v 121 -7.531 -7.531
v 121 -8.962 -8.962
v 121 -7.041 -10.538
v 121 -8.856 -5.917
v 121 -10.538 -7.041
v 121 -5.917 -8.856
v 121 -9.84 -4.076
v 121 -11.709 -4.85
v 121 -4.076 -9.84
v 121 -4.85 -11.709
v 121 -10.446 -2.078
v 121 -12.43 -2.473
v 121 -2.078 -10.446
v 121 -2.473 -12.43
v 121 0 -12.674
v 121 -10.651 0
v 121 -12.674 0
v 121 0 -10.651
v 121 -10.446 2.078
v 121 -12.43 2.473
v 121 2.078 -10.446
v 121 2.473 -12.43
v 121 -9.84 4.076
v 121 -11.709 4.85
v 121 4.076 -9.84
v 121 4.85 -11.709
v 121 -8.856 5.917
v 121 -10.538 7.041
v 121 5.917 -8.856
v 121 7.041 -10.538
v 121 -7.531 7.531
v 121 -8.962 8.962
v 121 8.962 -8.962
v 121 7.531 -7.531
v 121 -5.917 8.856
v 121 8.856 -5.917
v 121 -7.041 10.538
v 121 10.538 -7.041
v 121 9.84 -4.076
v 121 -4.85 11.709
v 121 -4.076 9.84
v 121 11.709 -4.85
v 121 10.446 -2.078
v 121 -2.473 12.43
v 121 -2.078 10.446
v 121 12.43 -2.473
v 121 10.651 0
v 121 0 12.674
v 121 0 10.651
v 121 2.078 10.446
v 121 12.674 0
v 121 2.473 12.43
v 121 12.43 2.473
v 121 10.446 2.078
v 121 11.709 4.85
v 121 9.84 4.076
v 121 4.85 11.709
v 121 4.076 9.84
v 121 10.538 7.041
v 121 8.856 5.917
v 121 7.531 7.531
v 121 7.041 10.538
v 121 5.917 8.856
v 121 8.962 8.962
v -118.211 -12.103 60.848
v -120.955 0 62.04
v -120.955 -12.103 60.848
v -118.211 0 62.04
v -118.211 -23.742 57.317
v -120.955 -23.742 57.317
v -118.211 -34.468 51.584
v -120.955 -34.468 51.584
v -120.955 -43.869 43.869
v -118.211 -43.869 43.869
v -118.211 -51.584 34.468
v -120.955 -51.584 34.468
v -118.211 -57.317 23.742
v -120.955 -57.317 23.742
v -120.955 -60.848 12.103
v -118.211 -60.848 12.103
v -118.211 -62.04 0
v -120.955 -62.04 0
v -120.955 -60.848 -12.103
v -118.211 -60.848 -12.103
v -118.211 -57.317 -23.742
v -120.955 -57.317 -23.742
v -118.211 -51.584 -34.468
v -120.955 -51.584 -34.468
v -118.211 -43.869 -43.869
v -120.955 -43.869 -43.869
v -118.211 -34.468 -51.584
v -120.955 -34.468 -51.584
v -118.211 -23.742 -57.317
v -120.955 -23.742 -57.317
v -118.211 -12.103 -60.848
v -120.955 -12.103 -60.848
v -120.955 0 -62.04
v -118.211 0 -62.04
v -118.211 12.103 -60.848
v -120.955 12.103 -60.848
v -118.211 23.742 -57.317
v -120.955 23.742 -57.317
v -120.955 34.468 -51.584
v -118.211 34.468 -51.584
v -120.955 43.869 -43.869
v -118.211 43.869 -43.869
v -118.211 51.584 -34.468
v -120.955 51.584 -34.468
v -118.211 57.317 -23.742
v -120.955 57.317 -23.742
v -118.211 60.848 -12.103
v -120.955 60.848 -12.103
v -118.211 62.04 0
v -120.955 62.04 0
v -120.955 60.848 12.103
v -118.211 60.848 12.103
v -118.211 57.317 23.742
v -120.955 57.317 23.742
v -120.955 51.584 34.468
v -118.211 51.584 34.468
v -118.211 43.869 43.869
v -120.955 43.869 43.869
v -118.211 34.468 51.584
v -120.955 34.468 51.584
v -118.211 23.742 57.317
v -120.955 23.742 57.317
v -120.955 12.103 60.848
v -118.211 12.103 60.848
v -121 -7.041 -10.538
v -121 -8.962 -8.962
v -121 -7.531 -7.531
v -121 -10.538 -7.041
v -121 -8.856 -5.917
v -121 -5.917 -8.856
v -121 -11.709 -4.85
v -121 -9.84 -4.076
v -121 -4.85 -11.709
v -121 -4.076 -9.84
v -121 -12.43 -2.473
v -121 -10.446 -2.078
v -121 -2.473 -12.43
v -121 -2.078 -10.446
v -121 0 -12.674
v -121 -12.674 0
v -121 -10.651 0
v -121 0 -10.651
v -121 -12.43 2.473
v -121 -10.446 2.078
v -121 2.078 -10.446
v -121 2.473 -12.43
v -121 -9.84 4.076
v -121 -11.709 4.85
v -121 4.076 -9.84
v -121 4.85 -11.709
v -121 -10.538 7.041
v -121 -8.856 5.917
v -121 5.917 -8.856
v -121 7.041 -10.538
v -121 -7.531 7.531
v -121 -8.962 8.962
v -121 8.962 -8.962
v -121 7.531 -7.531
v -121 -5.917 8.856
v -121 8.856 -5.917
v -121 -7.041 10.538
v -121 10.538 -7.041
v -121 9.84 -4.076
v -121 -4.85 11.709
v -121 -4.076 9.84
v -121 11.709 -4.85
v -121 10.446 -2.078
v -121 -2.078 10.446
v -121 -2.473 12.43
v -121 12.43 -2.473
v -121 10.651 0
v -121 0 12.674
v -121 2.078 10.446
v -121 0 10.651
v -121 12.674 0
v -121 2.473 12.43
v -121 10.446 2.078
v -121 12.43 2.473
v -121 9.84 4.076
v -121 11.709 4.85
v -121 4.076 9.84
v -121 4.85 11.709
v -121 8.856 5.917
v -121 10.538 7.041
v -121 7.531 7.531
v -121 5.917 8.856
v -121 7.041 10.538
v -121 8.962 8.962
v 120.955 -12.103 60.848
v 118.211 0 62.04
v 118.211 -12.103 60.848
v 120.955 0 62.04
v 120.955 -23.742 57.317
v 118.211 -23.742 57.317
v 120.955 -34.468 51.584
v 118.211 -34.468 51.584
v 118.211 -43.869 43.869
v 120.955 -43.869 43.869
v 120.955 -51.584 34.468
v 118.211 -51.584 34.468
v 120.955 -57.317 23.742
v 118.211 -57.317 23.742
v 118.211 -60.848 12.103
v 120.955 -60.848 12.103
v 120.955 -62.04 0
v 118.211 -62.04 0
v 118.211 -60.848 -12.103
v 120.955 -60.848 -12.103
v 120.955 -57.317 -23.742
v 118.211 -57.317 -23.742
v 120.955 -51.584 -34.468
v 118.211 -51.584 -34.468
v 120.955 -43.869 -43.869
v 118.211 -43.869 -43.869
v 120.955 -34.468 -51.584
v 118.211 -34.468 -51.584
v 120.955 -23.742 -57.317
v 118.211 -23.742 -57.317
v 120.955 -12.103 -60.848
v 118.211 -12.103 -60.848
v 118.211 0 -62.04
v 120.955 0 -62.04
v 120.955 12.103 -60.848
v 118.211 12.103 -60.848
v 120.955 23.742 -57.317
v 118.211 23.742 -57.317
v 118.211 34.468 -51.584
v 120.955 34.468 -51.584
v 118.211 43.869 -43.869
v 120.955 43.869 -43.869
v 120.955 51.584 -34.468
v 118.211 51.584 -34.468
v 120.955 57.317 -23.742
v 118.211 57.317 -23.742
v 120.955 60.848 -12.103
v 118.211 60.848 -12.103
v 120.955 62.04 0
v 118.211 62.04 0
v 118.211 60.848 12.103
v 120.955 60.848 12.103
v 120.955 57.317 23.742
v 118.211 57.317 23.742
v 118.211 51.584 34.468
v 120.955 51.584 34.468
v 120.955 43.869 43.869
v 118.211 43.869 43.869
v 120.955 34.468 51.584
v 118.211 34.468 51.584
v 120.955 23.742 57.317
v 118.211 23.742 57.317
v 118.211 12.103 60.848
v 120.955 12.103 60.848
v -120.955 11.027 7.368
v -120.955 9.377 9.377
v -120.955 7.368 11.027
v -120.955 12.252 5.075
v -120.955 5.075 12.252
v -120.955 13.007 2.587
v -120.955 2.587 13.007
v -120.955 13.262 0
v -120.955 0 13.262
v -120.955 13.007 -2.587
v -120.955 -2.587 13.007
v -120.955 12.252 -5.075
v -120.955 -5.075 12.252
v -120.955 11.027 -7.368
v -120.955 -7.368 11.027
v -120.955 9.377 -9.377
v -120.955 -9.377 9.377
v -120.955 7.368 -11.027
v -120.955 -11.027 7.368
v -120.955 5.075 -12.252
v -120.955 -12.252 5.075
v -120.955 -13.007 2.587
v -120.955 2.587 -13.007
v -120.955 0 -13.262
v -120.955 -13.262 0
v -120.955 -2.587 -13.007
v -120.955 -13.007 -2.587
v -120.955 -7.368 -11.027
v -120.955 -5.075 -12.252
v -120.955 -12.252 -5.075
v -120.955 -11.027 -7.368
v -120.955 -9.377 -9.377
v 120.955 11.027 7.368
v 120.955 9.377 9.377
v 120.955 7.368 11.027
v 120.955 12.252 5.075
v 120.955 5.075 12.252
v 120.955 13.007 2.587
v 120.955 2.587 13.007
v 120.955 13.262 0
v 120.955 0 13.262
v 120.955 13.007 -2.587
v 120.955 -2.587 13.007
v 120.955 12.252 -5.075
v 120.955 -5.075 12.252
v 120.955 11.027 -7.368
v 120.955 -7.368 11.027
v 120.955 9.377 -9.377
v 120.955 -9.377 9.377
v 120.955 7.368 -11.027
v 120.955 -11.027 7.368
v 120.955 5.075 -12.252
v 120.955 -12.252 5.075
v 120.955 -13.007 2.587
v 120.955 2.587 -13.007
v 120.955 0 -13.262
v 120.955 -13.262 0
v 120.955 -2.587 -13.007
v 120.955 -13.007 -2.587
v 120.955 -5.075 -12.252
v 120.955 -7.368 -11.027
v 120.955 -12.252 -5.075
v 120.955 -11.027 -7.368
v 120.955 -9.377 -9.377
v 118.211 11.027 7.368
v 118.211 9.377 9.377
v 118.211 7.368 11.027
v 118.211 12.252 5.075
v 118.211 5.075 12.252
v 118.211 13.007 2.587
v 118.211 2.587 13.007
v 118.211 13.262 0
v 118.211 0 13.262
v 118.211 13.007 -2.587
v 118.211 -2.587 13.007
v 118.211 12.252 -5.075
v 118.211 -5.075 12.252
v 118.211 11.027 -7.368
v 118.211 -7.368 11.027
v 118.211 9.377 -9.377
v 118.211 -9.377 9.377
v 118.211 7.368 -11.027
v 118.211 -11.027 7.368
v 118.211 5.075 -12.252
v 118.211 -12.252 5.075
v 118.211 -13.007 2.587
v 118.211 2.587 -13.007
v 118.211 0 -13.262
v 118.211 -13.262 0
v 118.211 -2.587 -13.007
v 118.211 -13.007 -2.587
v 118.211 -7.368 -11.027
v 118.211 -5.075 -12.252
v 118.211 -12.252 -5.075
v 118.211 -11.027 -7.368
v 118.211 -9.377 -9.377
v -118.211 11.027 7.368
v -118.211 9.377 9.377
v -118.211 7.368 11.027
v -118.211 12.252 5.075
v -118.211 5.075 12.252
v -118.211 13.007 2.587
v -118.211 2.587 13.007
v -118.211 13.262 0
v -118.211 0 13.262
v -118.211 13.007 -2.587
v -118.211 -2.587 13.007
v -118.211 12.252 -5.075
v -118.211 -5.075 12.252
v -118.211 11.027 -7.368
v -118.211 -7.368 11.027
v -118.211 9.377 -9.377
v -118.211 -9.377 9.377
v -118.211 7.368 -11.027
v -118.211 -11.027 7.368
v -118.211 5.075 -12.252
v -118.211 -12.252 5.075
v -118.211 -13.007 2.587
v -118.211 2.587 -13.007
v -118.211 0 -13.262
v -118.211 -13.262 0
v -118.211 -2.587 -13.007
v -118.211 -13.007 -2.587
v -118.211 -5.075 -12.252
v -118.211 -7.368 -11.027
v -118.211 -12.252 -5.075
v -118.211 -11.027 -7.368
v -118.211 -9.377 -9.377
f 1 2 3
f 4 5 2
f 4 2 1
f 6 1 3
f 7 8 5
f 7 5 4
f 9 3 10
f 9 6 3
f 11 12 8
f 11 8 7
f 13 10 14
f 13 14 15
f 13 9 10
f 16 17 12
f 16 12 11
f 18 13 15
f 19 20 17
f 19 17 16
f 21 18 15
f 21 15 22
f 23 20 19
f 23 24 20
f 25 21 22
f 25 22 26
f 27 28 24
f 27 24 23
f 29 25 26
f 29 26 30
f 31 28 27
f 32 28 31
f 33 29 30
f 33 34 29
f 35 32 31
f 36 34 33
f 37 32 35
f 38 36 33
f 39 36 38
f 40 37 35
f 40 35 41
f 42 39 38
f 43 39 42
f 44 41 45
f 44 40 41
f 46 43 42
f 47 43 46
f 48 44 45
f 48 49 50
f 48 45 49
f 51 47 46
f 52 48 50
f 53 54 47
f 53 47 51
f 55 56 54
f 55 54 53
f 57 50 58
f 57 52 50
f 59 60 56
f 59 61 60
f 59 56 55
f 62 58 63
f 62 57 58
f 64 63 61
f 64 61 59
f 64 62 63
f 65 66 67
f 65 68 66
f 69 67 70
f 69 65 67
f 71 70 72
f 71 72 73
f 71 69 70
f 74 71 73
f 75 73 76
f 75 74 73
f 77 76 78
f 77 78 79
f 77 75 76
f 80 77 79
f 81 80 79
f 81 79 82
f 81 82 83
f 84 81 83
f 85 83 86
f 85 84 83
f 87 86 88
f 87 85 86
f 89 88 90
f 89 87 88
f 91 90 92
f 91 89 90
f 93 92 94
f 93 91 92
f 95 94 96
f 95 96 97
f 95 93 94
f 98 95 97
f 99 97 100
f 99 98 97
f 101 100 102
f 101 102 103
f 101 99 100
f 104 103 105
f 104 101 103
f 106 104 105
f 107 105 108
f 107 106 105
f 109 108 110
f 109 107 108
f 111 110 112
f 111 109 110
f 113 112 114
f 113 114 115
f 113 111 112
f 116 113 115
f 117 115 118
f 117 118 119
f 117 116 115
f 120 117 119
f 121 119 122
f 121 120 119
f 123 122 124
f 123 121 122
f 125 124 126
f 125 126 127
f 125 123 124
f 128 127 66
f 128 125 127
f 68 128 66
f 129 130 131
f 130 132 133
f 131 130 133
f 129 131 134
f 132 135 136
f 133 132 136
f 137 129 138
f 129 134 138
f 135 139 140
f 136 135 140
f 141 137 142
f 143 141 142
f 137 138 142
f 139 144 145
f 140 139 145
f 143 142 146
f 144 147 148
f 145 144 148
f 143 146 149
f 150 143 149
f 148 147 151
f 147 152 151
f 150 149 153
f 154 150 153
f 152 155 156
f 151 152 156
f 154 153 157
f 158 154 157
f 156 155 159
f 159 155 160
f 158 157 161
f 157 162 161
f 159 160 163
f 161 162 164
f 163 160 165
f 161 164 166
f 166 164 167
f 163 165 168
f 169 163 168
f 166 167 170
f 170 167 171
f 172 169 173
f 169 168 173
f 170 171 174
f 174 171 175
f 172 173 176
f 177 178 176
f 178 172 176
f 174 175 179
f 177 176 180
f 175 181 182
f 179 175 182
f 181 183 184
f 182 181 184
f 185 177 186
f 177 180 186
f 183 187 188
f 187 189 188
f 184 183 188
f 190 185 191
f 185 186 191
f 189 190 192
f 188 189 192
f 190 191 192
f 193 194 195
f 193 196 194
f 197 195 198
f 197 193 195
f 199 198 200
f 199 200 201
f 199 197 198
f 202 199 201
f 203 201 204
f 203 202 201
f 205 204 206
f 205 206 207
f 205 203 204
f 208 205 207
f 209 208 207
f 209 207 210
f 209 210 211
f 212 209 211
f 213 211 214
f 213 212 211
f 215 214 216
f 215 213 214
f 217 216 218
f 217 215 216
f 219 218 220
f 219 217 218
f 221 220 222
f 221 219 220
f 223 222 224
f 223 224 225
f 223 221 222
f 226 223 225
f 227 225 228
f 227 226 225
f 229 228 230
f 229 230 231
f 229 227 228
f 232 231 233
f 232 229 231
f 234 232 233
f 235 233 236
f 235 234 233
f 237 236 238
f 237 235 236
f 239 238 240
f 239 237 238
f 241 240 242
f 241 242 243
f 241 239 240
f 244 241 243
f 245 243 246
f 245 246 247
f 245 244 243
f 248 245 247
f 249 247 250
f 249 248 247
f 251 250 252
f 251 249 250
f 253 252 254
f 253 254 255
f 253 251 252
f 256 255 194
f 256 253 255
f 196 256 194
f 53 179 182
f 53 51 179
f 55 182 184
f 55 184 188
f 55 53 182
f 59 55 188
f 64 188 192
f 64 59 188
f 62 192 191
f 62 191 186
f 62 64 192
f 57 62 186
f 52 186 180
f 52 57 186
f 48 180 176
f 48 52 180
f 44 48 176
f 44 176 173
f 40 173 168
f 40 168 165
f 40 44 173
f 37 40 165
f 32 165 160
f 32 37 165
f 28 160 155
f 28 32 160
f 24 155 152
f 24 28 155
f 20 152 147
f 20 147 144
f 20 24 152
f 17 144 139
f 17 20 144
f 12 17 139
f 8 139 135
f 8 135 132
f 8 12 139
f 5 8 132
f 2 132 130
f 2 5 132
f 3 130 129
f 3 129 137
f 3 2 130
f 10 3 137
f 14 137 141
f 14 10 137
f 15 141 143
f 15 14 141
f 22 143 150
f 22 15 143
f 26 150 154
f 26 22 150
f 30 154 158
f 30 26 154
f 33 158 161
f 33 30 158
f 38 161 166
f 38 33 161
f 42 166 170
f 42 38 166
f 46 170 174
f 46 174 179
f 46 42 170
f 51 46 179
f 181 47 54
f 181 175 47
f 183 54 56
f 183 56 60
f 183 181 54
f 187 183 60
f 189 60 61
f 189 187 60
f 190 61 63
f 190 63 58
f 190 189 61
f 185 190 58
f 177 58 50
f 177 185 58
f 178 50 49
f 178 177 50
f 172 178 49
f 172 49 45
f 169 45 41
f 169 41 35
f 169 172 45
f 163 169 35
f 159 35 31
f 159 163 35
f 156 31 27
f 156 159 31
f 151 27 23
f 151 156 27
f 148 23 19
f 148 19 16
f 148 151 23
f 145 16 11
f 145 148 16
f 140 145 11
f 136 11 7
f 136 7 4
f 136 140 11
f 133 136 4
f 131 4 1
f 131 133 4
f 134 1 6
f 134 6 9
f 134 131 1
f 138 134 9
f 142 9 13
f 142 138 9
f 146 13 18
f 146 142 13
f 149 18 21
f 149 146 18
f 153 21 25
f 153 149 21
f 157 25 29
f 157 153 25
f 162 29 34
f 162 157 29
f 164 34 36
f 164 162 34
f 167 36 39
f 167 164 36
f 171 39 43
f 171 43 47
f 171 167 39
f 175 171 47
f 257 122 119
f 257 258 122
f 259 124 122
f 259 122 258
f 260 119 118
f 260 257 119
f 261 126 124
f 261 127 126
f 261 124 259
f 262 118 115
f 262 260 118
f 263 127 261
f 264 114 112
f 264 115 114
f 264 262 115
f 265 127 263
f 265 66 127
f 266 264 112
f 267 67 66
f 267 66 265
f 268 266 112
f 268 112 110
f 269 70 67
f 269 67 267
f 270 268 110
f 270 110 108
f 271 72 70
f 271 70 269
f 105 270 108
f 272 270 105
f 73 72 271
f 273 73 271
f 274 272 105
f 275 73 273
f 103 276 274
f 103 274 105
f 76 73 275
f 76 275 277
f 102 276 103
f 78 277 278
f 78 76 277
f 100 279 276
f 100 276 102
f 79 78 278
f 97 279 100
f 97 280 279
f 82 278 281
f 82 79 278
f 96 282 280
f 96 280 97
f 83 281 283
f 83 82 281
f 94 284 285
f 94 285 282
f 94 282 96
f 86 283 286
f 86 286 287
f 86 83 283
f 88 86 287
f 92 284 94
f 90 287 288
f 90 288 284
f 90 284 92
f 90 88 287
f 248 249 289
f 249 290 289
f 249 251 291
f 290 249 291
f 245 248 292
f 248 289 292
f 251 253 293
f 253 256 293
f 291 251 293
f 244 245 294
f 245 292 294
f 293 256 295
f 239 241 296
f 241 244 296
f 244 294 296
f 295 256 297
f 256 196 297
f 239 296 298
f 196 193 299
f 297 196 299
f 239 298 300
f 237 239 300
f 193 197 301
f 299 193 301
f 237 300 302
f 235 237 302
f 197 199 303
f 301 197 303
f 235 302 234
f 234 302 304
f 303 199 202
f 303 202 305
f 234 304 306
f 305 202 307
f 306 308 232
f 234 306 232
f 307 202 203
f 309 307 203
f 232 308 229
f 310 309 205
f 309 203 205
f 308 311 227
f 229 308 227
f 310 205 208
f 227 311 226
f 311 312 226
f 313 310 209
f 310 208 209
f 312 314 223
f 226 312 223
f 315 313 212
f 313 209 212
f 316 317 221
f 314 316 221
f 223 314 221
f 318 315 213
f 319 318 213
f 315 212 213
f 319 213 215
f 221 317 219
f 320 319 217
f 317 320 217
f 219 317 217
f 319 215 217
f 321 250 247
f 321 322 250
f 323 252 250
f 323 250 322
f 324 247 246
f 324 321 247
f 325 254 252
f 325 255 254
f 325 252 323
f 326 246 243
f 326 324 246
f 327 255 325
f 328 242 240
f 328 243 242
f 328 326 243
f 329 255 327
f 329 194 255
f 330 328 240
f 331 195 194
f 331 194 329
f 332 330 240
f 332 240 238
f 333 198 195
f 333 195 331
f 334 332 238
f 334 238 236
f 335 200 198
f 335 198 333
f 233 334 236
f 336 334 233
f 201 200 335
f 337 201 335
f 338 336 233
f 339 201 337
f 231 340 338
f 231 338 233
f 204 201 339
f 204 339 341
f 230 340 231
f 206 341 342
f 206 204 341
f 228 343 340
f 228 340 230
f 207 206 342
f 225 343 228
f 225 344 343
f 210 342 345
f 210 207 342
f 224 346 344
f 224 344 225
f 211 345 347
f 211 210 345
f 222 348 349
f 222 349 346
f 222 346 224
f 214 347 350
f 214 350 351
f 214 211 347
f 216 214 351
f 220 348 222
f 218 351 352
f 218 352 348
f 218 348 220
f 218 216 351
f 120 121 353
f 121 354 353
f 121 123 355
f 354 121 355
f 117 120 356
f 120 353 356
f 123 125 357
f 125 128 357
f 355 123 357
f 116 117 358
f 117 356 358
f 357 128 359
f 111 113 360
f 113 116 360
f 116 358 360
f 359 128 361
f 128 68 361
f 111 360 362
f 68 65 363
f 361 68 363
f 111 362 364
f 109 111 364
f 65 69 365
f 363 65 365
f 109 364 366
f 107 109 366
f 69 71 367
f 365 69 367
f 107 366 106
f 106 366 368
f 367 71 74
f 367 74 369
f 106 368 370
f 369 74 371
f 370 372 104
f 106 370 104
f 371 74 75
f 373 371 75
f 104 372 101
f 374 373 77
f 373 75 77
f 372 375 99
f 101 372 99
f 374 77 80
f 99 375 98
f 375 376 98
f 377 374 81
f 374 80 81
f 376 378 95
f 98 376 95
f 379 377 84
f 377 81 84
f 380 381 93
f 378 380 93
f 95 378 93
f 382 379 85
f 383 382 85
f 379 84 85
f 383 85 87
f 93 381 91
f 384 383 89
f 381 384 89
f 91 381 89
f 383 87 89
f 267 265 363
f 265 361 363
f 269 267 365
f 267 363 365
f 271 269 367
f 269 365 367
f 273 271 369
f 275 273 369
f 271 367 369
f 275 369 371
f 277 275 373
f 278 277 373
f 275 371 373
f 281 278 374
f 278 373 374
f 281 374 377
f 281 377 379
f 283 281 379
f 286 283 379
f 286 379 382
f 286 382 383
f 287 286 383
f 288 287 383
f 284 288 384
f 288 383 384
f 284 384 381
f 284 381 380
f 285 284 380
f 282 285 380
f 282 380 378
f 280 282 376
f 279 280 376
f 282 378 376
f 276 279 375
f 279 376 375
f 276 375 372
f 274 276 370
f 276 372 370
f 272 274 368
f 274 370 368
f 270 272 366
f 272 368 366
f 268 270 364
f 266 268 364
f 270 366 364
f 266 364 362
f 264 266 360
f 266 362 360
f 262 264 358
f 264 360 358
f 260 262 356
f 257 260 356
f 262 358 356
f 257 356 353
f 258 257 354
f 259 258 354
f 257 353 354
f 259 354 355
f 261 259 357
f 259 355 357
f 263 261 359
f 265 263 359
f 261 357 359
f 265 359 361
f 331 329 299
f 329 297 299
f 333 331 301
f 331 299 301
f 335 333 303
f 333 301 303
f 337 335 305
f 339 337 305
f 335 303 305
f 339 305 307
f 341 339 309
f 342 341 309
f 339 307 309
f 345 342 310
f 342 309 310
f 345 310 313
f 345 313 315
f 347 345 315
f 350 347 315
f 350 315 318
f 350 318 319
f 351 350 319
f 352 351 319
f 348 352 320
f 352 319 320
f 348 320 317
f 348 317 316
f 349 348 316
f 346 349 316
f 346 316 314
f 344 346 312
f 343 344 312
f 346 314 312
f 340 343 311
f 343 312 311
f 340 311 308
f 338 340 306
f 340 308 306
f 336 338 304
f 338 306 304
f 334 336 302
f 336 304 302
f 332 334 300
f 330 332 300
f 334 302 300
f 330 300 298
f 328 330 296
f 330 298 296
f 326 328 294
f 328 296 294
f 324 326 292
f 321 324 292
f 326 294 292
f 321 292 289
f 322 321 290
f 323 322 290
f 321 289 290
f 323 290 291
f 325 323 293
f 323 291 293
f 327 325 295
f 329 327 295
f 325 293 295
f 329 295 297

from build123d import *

# Parameters (mm, degrees)
F0_R     = 12.673908
F0_R_2   = 10.651044
F1_DEPTH = 121
F3_W     = 2.743781
F3_H     = 48.778334


with BuildPart() as f1:
    # F0 (on Right) → F1 (new body, symmetric)
    with BuildSketch(Plane.YZ):
        Circle(F0_R)
        Circle(F0_R_2, mode=Mode.SUBTRACT)
    extrude(amount=F1_DEPTH, both=True)


with BuildPart() as f4:
    # F3 (on Front) → F4 (revolve)
    with BuildSketch(Plane.XZ):
        with Locations((-119.583123, 37.650775)):
            Rectangle(F3_W, F3_H)
        with Locations((119.583123, 37.650775)):
            Rectangle(F3_W, F3_H)
    revolve(axis=Axis((63.602366, 0, 0), (1, 0, 0)))


solid = Compound([f1.part, f4.part])
